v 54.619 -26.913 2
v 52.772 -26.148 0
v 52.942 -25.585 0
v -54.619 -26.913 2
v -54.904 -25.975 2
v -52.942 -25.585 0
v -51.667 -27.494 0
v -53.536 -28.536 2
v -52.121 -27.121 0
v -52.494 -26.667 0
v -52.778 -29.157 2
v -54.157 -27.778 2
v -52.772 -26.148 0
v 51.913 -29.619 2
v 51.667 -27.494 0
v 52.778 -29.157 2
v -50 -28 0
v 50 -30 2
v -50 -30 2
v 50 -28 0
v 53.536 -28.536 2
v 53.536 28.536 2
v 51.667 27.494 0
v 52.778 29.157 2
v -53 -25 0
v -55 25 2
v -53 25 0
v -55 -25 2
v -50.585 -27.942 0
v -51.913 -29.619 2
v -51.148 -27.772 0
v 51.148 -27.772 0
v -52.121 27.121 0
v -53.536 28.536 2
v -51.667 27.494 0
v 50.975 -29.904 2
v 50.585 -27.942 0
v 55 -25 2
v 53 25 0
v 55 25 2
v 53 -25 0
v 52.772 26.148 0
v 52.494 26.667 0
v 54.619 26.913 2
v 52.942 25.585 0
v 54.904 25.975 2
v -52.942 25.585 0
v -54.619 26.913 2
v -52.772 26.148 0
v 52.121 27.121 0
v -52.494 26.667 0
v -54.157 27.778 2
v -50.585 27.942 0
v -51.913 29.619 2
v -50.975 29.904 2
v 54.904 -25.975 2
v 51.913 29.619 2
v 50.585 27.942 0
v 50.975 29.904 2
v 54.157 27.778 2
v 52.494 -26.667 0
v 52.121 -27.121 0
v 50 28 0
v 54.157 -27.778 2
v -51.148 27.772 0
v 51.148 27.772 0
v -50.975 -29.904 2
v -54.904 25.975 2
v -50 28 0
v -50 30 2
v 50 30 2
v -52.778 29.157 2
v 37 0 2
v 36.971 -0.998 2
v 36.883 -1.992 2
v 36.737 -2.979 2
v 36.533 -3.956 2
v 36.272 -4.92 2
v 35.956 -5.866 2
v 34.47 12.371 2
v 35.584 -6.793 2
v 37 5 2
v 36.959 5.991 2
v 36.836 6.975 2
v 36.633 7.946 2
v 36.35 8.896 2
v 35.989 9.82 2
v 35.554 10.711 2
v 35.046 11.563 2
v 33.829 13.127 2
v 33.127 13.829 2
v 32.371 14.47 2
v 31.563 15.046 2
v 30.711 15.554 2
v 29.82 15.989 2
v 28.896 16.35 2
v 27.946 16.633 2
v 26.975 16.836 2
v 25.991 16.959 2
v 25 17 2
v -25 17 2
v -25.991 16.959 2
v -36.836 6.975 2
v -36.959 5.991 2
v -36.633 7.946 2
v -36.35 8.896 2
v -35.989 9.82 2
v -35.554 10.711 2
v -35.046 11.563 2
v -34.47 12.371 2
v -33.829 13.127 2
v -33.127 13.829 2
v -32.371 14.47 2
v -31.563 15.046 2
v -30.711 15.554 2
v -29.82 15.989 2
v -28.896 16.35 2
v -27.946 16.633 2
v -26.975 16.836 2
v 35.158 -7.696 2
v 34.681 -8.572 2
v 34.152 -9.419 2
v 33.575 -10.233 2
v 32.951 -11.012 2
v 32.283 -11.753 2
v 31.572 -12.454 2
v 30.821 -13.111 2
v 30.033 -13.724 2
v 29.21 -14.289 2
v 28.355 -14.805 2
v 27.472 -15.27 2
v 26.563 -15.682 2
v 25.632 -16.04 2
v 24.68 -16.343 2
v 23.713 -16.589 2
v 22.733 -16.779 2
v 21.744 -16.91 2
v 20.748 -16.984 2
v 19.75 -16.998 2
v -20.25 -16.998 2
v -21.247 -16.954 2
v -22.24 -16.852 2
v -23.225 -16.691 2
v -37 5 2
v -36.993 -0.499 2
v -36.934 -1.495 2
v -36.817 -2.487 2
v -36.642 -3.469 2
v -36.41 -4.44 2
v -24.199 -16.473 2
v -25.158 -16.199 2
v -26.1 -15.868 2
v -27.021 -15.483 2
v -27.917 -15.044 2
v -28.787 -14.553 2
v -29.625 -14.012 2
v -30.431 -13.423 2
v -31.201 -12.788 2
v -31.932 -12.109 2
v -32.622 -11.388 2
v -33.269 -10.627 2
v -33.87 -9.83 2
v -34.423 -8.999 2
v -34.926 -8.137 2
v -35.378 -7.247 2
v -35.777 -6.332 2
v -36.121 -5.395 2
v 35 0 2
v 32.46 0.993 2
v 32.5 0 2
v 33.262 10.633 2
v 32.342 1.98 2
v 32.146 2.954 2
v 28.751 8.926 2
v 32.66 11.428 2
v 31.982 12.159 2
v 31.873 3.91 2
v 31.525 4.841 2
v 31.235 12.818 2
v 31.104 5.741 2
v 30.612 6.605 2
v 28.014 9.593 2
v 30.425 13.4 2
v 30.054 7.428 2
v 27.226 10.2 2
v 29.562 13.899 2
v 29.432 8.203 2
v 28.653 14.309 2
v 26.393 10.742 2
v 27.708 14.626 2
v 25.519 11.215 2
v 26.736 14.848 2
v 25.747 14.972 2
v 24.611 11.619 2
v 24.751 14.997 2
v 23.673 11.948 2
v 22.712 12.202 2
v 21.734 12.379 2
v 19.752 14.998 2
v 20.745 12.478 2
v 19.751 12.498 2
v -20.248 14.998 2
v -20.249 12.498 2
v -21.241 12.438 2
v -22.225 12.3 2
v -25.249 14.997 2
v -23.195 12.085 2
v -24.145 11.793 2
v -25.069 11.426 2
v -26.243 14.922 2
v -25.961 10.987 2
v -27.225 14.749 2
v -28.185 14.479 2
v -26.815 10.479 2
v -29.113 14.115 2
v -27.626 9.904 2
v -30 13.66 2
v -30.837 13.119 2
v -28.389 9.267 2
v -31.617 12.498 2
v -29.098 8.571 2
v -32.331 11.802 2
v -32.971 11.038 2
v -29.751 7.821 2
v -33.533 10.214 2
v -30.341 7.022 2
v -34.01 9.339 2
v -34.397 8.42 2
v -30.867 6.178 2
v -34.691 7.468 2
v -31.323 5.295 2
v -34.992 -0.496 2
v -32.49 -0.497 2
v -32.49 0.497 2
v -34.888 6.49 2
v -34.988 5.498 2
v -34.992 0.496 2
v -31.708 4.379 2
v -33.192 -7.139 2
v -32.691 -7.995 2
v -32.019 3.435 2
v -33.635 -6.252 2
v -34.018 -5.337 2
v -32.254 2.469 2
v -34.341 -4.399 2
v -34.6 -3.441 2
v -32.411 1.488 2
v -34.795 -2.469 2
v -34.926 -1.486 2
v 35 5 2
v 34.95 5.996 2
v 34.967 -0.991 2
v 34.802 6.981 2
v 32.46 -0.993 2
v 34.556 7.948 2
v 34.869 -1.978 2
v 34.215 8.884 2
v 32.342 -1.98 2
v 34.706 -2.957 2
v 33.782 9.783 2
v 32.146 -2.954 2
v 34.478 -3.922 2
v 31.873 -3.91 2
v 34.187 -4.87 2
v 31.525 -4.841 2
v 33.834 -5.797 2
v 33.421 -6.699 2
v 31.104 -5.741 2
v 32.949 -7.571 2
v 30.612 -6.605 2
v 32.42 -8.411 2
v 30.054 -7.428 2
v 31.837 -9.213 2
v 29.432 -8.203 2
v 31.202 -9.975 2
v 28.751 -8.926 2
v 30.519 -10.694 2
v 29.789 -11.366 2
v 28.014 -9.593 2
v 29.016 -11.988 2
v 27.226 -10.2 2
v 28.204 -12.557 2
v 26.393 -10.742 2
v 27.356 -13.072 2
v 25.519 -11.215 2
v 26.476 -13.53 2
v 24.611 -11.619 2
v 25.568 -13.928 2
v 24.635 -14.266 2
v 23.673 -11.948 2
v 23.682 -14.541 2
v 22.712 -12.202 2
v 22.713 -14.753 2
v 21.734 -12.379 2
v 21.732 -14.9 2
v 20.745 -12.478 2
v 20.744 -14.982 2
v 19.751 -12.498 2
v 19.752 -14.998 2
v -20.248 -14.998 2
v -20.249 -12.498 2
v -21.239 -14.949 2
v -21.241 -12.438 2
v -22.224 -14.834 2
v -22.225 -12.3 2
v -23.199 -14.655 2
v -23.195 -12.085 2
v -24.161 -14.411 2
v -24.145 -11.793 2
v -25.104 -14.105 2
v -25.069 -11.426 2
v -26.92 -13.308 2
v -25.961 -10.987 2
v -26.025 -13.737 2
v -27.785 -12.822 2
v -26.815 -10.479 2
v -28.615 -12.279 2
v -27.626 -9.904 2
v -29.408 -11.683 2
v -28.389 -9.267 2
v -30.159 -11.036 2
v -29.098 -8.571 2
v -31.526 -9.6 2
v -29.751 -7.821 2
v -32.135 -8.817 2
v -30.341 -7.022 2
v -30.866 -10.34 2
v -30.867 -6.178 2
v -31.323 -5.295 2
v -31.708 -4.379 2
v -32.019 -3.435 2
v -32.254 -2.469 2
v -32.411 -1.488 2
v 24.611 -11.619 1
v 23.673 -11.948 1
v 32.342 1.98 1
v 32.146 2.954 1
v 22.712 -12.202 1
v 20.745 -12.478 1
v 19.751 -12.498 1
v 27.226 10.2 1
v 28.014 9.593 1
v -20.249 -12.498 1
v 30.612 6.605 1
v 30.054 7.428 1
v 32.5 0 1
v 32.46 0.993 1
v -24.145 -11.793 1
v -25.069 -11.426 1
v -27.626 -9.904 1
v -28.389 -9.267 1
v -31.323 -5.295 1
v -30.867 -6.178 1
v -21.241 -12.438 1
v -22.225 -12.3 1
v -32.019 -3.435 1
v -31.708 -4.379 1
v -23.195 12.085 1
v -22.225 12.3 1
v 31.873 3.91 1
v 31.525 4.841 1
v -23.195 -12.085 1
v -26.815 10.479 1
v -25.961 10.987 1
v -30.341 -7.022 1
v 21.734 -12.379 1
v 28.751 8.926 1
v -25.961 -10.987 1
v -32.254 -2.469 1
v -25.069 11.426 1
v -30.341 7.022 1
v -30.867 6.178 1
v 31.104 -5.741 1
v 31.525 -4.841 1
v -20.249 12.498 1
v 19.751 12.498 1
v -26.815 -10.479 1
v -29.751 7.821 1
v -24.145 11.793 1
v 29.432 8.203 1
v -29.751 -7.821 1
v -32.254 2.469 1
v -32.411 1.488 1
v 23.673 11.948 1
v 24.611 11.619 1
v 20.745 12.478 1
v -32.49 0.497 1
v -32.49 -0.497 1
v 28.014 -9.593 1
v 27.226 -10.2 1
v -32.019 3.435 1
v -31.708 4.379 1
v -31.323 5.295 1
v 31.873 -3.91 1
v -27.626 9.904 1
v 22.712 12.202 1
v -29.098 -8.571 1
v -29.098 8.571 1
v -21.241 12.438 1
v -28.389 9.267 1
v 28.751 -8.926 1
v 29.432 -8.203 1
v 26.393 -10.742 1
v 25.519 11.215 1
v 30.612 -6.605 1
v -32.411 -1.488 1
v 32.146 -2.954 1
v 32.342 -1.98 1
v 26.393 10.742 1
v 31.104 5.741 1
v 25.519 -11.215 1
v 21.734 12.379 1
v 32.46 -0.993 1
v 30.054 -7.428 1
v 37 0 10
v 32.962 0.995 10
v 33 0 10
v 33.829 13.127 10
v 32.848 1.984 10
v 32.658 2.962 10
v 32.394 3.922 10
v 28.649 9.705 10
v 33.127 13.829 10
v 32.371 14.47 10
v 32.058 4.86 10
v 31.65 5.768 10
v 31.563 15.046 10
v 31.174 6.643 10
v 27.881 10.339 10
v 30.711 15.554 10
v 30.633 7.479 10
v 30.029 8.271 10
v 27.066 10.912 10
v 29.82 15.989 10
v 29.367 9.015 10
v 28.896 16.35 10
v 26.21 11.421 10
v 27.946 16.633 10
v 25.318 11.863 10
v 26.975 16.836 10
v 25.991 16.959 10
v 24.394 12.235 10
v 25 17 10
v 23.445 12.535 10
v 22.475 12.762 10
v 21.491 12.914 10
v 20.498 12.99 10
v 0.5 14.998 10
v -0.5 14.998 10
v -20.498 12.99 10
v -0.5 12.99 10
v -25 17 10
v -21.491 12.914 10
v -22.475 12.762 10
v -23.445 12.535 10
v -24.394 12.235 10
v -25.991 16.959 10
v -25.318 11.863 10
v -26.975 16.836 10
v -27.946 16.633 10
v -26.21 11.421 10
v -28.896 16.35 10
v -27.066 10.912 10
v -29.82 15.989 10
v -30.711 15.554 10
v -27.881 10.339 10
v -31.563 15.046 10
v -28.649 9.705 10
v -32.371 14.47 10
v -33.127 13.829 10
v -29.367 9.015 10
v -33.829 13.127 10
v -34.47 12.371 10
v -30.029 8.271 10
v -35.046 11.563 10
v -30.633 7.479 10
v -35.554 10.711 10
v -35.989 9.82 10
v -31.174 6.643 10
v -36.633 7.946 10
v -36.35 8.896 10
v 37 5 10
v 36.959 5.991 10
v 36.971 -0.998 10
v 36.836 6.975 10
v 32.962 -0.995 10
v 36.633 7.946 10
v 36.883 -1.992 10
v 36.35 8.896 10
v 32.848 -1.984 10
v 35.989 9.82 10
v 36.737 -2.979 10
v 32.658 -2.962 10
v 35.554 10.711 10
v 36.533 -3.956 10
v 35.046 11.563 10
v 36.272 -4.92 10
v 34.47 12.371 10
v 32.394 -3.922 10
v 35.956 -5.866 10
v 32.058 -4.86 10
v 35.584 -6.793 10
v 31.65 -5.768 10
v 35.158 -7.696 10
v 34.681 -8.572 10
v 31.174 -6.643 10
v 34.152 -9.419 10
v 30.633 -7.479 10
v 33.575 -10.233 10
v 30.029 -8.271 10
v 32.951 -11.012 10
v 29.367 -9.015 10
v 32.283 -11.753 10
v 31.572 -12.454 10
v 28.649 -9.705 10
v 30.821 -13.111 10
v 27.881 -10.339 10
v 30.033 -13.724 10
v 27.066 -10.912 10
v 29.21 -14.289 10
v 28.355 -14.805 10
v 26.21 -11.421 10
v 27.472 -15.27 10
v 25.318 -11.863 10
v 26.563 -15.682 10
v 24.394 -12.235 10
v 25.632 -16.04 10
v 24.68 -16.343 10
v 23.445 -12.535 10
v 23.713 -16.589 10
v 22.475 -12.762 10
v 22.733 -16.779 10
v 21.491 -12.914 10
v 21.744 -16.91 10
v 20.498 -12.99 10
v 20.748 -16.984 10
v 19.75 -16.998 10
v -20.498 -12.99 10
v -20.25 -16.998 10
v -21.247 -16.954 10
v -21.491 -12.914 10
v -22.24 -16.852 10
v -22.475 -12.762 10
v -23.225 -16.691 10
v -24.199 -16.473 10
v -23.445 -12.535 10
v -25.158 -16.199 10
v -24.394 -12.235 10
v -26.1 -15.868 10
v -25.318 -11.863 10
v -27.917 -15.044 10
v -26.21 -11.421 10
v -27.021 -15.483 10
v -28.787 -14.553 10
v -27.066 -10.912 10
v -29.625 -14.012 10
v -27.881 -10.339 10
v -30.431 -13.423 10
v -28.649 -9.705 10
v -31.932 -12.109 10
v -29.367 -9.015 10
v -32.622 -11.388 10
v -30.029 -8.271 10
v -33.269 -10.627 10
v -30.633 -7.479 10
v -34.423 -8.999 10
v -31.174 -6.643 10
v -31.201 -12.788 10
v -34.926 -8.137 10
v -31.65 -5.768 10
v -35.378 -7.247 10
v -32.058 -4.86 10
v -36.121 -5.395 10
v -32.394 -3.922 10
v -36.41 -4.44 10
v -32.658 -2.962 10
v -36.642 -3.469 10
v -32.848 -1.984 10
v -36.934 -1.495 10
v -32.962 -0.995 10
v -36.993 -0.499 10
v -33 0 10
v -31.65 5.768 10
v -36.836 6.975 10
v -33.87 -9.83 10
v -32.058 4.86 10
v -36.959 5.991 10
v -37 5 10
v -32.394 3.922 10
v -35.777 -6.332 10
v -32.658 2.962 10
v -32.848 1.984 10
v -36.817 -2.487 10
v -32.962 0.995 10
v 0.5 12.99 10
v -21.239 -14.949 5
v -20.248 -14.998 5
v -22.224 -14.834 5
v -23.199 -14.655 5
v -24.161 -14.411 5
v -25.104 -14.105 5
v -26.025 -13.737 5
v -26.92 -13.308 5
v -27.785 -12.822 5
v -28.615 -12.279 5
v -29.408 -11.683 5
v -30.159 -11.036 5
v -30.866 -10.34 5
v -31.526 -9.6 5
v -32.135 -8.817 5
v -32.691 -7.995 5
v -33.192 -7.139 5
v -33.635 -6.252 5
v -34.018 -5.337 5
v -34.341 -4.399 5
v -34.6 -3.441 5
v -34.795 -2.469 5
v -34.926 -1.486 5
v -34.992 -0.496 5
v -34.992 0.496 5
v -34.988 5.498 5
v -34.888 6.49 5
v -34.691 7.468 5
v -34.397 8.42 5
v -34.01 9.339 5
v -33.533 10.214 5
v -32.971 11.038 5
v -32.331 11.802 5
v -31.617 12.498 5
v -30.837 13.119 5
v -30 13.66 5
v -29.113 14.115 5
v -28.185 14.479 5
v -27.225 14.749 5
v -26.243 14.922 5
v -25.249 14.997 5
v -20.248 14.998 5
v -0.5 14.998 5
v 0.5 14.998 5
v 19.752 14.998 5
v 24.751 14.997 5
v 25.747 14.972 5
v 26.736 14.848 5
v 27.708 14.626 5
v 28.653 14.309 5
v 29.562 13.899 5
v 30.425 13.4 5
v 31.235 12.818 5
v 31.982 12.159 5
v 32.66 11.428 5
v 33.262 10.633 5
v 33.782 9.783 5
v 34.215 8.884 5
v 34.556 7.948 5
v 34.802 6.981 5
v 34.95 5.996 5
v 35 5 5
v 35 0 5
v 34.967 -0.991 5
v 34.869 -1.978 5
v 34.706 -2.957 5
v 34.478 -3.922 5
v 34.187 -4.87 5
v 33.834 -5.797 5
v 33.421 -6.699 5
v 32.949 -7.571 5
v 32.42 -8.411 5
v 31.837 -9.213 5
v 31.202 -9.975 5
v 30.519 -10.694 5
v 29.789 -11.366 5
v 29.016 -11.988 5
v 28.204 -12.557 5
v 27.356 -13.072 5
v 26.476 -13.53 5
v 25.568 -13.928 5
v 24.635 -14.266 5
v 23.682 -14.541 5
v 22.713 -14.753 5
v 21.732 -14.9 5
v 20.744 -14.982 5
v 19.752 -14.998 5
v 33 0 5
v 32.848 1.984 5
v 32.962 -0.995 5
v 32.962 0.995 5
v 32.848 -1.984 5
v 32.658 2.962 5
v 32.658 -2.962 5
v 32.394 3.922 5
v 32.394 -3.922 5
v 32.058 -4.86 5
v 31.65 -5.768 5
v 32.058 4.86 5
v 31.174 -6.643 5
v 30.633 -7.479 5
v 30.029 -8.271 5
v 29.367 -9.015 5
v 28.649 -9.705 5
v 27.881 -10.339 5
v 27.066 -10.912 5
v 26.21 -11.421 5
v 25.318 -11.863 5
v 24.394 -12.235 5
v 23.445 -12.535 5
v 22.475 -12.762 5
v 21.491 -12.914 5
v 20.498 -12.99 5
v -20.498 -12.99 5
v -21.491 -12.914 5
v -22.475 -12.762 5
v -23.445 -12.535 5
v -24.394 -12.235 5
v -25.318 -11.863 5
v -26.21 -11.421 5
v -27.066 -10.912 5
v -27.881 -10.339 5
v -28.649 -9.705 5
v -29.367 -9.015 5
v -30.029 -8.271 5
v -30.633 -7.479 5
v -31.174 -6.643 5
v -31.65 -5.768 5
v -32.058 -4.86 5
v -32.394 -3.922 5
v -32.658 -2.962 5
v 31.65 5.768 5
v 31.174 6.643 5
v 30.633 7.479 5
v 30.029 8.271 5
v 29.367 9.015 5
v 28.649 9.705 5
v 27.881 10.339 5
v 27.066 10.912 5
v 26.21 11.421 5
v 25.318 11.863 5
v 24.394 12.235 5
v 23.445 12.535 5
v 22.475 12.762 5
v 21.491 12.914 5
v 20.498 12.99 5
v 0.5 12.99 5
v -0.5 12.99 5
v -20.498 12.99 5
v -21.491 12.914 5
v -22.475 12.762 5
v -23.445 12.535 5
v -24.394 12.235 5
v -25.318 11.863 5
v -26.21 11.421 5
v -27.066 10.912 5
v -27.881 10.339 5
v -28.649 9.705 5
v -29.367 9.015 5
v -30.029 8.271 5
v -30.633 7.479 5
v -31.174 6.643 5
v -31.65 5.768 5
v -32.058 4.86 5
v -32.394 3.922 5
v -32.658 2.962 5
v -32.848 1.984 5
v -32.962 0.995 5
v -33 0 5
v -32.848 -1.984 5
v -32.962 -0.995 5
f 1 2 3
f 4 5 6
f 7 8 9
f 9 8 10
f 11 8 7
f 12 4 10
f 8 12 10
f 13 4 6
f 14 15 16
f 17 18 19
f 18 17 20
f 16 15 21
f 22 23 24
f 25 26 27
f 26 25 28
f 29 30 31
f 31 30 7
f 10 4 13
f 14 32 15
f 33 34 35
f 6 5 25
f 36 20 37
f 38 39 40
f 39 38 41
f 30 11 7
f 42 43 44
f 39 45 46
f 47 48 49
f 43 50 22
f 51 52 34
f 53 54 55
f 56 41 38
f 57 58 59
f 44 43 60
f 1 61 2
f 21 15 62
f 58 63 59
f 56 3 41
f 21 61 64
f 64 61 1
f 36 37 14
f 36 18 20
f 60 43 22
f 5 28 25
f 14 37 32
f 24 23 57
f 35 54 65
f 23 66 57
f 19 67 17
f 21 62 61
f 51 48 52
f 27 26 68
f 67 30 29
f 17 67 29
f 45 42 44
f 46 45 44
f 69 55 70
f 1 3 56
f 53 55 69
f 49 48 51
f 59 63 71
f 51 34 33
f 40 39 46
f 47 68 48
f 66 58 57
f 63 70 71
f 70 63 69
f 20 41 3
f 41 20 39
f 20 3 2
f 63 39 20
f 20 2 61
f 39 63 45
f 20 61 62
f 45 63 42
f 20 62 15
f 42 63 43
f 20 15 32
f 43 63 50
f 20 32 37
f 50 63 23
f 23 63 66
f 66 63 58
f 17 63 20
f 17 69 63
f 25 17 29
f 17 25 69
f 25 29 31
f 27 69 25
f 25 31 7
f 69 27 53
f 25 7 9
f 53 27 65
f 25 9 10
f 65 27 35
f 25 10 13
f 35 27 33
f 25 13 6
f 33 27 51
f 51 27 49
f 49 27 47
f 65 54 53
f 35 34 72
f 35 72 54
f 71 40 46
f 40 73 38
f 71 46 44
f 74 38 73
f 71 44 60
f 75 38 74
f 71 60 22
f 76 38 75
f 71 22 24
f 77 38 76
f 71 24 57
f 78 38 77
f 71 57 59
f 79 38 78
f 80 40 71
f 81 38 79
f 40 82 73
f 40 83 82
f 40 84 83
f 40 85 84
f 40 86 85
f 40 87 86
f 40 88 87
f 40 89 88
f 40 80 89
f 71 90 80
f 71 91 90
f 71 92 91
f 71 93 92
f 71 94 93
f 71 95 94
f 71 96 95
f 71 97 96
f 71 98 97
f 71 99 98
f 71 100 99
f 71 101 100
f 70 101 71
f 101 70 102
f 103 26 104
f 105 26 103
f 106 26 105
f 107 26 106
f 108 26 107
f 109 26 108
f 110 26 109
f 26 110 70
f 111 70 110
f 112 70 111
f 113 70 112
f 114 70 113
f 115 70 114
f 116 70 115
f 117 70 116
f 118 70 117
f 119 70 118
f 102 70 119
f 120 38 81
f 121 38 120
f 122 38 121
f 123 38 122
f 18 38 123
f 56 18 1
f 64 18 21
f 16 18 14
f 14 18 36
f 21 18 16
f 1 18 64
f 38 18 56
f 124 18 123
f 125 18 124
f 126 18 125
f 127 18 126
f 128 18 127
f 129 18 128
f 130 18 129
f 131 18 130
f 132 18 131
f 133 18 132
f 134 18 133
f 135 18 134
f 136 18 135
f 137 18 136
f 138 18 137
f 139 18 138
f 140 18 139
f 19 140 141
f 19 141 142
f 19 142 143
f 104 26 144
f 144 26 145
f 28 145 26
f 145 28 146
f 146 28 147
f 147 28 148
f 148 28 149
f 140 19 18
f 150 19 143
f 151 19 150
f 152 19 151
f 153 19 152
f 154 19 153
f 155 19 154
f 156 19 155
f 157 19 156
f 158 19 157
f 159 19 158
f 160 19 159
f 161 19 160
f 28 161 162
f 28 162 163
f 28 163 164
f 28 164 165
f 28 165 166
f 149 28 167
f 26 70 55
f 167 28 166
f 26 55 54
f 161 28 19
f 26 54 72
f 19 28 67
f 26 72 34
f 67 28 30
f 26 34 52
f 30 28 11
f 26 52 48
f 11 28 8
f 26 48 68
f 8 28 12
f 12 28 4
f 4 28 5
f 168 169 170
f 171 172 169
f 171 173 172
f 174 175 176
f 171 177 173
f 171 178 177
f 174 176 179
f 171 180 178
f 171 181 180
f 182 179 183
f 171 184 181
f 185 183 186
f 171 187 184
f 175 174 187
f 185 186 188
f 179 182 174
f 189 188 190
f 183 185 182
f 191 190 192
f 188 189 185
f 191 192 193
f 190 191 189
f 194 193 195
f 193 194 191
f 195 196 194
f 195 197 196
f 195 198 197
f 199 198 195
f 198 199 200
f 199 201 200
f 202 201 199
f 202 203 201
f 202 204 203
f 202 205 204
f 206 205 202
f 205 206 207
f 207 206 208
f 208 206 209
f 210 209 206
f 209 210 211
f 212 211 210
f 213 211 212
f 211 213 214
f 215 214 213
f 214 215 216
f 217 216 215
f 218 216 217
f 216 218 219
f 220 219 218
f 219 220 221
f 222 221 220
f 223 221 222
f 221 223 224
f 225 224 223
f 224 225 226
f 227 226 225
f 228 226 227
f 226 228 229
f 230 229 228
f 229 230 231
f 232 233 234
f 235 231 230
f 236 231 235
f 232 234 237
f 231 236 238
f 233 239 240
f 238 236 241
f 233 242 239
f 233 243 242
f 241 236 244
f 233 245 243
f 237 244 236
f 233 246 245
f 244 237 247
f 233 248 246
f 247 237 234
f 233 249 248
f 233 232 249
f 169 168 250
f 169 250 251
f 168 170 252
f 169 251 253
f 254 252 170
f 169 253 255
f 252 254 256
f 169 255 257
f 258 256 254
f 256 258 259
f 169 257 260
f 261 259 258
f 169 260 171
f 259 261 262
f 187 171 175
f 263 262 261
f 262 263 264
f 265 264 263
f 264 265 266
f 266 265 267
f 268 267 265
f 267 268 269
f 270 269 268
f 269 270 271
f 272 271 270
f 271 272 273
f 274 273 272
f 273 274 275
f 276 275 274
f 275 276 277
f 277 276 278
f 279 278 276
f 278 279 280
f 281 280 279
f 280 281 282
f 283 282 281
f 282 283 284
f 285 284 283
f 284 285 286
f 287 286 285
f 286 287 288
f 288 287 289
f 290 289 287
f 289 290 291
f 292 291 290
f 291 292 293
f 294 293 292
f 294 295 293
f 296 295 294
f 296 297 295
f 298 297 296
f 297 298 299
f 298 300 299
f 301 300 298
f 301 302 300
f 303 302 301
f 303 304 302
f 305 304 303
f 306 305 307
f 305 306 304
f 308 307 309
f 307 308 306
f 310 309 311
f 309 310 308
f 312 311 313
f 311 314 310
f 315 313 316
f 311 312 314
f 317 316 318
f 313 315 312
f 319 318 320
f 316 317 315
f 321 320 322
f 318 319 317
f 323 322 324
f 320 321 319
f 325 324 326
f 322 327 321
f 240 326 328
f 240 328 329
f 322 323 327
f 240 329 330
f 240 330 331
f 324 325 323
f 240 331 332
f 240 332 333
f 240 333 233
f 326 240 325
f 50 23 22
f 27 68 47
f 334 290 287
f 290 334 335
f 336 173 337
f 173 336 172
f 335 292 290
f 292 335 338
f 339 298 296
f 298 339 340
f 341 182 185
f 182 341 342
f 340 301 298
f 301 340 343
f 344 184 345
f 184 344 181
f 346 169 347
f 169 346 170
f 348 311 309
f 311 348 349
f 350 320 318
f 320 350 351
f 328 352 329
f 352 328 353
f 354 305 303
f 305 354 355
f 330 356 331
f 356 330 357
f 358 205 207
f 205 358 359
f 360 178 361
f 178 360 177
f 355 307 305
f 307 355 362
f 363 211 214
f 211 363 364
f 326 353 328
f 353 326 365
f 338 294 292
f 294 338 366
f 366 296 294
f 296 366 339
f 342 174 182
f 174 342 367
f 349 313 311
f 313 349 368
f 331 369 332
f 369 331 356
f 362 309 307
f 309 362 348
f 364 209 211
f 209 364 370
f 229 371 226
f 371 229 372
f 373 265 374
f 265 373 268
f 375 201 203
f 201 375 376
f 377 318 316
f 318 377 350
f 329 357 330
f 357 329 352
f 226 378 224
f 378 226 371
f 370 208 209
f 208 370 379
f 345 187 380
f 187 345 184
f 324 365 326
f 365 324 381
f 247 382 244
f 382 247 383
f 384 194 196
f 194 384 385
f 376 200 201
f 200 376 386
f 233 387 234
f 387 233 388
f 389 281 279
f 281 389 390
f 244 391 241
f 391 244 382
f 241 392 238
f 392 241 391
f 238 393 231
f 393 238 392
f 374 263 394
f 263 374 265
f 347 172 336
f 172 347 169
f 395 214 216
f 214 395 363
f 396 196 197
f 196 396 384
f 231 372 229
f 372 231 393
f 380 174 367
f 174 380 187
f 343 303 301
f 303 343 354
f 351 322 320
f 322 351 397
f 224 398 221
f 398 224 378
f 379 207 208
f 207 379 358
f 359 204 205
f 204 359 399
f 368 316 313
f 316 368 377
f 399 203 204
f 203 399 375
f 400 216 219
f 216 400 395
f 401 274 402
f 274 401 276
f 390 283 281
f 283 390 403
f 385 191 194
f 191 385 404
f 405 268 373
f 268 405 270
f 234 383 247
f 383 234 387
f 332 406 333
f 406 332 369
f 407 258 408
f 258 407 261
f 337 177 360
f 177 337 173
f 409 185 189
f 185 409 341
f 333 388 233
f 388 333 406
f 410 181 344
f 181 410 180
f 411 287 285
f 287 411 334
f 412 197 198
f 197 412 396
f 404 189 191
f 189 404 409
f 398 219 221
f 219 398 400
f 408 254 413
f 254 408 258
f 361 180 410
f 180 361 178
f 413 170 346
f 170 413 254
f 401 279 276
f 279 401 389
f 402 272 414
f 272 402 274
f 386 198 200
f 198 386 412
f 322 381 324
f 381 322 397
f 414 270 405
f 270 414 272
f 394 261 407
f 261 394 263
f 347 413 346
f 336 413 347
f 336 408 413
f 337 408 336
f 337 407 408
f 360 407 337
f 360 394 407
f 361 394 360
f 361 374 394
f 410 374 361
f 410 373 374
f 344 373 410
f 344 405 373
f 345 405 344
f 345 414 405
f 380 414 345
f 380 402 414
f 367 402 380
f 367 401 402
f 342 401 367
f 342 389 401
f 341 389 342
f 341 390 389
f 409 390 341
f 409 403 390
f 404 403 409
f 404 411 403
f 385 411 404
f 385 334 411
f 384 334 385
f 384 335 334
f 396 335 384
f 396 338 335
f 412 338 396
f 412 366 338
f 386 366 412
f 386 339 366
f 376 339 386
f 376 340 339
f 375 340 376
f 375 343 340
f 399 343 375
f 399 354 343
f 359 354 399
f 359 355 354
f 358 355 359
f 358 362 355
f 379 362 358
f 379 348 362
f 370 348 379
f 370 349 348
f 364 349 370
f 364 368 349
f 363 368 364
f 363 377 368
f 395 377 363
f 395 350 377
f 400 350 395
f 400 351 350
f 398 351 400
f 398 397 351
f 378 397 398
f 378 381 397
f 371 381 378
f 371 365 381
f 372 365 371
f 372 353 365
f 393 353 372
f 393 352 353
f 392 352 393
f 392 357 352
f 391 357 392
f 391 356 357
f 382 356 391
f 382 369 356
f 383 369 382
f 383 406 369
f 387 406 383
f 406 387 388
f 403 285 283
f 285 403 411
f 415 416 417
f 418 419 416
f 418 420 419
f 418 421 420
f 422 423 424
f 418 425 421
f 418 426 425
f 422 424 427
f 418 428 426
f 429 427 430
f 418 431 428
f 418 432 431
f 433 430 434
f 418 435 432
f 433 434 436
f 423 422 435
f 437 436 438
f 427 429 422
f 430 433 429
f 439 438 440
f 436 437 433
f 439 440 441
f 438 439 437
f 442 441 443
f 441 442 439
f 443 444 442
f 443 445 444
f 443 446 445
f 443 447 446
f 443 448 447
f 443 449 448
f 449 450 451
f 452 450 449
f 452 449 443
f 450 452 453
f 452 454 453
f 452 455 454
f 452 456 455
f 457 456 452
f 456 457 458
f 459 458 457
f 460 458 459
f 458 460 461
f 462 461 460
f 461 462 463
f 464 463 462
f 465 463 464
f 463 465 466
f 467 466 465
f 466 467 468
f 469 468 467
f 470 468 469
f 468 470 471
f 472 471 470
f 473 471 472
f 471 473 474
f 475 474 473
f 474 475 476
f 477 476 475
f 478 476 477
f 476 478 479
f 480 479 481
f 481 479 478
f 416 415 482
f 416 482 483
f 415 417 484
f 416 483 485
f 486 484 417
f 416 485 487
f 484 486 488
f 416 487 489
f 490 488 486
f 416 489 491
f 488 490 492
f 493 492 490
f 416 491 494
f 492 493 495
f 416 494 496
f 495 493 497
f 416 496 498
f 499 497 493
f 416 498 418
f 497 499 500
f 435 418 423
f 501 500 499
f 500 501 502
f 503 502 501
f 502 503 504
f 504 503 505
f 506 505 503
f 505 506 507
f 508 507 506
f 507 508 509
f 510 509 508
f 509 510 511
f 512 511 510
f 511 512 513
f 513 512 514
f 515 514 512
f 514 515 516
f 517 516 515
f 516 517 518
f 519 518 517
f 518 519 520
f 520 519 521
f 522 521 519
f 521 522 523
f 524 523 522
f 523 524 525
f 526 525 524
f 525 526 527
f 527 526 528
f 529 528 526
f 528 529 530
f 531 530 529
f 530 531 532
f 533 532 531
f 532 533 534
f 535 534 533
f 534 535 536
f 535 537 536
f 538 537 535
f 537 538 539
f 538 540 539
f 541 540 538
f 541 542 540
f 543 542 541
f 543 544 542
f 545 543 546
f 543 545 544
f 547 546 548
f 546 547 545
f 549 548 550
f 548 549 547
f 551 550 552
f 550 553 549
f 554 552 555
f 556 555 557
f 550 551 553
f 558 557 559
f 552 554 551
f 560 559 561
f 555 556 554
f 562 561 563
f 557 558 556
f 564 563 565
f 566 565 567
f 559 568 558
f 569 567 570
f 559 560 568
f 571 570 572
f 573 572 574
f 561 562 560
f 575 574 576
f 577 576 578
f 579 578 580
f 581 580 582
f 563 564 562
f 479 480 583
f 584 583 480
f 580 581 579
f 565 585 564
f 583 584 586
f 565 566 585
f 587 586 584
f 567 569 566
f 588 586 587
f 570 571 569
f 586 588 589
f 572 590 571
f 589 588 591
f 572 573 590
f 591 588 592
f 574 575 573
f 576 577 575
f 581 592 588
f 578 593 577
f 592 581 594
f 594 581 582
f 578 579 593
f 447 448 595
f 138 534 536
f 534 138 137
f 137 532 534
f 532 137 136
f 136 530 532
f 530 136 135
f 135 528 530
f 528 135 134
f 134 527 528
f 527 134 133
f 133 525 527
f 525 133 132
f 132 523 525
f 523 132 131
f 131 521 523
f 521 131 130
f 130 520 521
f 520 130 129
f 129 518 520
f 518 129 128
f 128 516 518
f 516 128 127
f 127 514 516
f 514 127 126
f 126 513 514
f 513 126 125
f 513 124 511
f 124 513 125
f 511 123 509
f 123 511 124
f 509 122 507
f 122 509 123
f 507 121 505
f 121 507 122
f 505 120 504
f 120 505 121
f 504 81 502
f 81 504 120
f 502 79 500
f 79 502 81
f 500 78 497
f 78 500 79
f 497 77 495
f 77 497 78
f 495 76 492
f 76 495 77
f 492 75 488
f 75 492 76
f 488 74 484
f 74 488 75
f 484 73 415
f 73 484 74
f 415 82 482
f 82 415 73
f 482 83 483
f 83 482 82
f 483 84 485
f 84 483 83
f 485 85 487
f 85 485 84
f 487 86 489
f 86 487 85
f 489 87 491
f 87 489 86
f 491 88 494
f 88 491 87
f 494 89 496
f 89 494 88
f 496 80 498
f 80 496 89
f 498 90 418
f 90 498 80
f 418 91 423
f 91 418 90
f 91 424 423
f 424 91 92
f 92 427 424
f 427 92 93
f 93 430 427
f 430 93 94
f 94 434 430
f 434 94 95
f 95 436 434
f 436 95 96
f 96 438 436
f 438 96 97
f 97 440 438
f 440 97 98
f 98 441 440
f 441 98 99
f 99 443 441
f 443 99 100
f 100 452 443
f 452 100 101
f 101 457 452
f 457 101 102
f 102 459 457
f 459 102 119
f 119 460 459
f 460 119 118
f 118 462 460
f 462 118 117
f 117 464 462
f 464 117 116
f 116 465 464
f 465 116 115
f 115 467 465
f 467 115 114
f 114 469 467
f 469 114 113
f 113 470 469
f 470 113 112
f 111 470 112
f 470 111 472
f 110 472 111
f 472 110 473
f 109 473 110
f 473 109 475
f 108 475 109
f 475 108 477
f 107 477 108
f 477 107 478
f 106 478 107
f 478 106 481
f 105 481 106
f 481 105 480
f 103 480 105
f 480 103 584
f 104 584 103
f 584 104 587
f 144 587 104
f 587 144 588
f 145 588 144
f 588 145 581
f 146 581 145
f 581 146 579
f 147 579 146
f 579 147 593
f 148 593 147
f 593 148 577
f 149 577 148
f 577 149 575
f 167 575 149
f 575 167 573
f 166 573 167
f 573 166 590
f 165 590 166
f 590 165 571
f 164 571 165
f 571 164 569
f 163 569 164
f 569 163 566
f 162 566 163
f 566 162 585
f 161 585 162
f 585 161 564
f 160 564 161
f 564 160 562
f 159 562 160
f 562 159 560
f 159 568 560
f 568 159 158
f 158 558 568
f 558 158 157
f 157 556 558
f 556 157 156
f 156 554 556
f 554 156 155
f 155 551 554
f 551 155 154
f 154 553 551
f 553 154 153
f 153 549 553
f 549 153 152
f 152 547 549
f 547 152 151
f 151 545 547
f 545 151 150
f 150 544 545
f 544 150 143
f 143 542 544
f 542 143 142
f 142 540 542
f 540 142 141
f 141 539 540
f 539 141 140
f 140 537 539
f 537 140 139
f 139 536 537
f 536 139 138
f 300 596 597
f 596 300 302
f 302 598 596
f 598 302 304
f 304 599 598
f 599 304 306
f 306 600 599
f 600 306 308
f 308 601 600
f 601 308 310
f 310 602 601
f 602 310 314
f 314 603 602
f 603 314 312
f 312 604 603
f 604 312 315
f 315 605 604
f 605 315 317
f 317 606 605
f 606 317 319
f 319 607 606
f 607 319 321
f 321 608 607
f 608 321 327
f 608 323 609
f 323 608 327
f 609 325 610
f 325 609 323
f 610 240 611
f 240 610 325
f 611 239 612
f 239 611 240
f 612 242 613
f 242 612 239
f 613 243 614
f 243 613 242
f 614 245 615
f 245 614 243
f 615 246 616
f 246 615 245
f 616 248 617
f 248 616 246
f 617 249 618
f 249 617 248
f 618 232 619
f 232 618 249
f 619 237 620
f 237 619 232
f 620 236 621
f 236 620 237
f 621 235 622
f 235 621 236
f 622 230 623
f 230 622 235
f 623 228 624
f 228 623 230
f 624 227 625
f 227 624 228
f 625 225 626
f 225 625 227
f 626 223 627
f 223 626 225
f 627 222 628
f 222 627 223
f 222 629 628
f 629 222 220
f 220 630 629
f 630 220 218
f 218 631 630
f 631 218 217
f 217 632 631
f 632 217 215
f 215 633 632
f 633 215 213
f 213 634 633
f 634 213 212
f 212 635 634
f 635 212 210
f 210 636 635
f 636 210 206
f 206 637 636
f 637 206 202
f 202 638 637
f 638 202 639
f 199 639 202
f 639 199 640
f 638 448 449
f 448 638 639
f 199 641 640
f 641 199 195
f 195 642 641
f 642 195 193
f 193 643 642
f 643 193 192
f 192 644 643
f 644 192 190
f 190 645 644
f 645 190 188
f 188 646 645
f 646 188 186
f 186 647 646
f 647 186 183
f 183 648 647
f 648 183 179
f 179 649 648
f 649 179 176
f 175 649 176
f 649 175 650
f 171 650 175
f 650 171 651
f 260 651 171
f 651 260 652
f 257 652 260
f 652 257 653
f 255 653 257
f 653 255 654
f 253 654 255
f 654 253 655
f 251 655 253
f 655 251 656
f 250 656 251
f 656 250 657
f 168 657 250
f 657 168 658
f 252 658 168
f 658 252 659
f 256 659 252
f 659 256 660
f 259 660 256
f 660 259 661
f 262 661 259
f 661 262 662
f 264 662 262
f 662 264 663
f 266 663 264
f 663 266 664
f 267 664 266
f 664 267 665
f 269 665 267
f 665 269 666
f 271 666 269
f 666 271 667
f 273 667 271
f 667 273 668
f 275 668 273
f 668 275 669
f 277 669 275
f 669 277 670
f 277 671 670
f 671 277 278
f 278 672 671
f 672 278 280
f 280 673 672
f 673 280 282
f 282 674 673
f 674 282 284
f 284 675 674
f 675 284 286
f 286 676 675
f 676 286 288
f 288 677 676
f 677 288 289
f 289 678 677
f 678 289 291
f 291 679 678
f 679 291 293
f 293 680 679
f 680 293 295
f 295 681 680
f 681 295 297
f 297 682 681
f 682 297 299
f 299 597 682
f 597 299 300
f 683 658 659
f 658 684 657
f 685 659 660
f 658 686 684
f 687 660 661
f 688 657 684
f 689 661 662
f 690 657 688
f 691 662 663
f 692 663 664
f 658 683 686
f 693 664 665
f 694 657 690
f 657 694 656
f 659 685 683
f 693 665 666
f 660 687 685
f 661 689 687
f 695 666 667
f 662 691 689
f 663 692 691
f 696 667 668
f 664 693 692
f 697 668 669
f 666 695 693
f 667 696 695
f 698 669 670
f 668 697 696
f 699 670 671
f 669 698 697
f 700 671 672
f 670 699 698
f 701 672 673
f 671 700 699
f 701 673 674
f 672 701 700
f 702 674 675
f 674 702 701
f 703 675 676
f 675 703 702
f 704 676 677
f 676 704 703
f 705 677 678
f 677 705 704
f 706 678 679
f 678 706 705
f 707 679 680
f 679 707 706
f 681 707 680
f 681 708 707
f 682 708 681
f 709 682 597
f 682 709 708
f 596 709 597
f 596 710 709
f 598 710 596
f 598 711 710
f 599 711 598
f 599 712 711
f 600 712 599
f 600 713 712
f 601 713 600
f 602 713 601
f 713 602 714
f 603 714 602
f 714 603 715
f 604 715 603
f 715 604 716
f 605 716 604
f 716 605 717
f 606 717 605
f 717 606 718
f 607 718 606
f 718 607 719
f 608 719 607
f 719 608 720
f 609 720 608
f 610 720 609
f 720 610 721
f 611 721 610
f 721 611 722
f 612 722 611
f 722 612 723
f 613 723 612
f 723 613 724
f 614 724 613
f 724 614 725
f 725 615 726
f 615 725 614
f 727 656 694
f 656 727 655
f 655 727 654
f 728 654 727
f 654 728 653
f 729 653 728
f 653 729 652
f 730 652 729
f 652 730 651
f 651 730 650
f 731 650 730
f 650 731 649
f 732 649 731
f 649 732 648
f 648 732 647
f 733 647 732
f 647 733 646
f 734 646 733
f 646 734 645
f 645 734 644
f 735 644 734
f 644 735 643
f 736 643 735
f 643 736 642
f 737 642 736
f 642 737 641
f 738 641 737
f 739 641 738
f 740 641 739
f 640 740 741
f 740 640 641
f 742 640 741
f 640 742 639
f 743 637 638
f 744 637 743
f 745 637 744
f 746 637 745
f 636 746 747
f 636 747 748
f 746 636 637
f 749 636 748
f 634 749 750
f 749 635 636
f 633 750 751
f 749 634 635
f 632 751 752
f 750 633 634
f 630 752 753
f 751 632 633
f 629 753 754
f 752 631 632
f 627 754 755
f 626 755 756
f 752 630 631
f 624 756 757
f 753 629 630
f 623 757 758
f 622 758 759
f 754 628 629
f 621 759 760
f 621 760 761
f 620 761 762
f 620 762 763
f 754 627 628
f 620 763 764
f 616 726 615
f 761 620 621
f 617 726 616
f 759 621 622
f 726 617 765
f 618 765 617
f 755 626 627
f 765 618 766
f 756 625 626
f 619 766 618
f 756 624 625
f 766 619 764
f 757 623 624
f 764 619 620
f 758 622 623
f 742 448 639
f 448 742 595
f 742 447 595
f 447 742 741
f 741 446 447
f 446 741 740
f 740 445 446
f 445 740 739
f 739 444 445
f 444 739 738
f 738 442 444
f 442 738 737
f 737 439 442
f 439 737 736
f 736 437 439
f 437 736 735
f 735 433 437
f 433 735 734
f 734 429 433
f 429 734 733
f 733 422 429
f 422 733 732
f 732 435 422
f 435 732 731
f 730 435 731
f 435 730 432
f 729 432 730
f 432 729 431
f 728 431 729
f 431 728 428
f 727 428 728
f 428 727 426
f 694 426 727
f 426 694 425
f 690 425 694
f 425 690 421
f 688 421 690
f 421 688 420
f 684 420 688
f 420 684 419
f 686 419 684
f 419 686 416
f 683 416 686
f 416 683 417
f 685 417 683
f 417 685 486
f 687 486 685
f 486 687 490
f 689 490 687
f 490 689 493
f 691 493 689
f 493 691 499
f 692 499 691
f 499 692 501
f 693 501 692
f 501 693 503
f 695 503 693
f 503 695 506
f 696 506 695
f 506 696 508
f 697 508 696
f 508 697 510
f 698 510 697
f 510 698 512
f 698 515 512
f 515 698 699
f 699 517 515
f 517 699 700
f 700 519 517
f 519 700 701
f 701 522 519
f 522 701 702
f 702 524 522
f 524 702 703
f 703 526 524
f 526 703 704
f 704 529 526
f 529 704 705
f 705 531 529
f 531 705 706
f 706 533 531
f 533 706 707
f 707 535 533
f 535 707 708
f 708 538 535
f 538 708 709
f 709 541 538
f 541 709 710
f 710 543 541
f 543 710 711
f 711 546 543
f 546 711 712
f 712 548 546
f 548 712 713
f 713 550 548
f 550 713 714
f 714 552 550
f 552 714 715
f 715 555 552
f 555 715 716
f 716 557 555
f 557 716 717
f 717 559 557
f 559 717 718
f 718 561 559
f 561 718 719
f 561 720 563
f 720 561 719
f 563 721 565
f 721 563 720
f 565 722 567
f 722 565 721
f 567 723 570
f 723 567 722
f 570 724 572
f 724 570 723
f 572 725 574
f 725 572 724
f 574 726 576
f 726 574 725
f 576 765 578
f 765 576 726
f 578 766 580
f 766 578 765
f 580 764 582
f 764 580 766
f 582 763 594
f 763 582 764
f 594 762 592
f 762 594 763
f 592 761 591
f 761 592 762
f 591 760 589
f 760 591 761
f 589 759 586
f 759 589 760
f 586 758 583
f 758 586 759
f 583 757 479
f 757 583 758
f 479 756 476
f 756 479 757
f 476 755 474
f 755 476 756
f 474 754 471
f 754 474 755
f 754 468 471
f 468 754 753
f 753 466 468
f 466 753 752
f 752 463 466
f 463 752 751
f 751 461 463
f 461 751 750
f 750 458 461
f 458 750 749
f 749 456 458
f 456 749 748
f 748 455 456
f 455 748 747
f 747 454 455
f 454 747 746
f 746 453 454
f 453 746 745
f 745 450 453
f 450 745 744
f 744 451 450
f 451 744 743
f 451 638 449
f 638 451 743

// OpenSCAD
$fa=1;$fs=1;
ring_h=5;

module koma(r=5,a=2,dir){
	if(!dir||dir=="up")cylinder(h=a,r1=r,r2=r-a);
	if(!dir||dir=="down")scale(-1)cylinder(h=a,r1=r,r2=r-a);
}

module spk(o=0){
	hull(){
		translate([+(70/2-15),30/2-15])circle(r=15+o);
		translate([+(70/2-10),30/2-10])circle(r=10+o);
		translate([-(70/2-15),30/2-15])circle(r=15+o);
		translate([-(70/2-10),30/2-10])circle(r=10+o);
	}
}
module ring(){
	difference(){
		spk();
		minkowski(){
			square([70-15*2,1e-9],center=true);
			circle(r=13);
		}
		translate([-1/2,0])square([1,30]);
	}
}

module plate(){
	difference(){
		minkowski(){
			translate([0,0,2])cube([100,50,1e-9],center=true);
			koma(dir="down");
		}
		translate([0,0,1])linear_extrude(1.01)minkowski(){
			square([70-15*2,1e-9],center=true);
			circle(r=25/2);
		}
	}
	translate([0,0,2]){
		linear_extrude(3+ring_h)difference(){spk(2);spk();}
	}
}
module box(){}

plate();
translate([0,0,5])linear_extrude(ring_h)ring();
box();
